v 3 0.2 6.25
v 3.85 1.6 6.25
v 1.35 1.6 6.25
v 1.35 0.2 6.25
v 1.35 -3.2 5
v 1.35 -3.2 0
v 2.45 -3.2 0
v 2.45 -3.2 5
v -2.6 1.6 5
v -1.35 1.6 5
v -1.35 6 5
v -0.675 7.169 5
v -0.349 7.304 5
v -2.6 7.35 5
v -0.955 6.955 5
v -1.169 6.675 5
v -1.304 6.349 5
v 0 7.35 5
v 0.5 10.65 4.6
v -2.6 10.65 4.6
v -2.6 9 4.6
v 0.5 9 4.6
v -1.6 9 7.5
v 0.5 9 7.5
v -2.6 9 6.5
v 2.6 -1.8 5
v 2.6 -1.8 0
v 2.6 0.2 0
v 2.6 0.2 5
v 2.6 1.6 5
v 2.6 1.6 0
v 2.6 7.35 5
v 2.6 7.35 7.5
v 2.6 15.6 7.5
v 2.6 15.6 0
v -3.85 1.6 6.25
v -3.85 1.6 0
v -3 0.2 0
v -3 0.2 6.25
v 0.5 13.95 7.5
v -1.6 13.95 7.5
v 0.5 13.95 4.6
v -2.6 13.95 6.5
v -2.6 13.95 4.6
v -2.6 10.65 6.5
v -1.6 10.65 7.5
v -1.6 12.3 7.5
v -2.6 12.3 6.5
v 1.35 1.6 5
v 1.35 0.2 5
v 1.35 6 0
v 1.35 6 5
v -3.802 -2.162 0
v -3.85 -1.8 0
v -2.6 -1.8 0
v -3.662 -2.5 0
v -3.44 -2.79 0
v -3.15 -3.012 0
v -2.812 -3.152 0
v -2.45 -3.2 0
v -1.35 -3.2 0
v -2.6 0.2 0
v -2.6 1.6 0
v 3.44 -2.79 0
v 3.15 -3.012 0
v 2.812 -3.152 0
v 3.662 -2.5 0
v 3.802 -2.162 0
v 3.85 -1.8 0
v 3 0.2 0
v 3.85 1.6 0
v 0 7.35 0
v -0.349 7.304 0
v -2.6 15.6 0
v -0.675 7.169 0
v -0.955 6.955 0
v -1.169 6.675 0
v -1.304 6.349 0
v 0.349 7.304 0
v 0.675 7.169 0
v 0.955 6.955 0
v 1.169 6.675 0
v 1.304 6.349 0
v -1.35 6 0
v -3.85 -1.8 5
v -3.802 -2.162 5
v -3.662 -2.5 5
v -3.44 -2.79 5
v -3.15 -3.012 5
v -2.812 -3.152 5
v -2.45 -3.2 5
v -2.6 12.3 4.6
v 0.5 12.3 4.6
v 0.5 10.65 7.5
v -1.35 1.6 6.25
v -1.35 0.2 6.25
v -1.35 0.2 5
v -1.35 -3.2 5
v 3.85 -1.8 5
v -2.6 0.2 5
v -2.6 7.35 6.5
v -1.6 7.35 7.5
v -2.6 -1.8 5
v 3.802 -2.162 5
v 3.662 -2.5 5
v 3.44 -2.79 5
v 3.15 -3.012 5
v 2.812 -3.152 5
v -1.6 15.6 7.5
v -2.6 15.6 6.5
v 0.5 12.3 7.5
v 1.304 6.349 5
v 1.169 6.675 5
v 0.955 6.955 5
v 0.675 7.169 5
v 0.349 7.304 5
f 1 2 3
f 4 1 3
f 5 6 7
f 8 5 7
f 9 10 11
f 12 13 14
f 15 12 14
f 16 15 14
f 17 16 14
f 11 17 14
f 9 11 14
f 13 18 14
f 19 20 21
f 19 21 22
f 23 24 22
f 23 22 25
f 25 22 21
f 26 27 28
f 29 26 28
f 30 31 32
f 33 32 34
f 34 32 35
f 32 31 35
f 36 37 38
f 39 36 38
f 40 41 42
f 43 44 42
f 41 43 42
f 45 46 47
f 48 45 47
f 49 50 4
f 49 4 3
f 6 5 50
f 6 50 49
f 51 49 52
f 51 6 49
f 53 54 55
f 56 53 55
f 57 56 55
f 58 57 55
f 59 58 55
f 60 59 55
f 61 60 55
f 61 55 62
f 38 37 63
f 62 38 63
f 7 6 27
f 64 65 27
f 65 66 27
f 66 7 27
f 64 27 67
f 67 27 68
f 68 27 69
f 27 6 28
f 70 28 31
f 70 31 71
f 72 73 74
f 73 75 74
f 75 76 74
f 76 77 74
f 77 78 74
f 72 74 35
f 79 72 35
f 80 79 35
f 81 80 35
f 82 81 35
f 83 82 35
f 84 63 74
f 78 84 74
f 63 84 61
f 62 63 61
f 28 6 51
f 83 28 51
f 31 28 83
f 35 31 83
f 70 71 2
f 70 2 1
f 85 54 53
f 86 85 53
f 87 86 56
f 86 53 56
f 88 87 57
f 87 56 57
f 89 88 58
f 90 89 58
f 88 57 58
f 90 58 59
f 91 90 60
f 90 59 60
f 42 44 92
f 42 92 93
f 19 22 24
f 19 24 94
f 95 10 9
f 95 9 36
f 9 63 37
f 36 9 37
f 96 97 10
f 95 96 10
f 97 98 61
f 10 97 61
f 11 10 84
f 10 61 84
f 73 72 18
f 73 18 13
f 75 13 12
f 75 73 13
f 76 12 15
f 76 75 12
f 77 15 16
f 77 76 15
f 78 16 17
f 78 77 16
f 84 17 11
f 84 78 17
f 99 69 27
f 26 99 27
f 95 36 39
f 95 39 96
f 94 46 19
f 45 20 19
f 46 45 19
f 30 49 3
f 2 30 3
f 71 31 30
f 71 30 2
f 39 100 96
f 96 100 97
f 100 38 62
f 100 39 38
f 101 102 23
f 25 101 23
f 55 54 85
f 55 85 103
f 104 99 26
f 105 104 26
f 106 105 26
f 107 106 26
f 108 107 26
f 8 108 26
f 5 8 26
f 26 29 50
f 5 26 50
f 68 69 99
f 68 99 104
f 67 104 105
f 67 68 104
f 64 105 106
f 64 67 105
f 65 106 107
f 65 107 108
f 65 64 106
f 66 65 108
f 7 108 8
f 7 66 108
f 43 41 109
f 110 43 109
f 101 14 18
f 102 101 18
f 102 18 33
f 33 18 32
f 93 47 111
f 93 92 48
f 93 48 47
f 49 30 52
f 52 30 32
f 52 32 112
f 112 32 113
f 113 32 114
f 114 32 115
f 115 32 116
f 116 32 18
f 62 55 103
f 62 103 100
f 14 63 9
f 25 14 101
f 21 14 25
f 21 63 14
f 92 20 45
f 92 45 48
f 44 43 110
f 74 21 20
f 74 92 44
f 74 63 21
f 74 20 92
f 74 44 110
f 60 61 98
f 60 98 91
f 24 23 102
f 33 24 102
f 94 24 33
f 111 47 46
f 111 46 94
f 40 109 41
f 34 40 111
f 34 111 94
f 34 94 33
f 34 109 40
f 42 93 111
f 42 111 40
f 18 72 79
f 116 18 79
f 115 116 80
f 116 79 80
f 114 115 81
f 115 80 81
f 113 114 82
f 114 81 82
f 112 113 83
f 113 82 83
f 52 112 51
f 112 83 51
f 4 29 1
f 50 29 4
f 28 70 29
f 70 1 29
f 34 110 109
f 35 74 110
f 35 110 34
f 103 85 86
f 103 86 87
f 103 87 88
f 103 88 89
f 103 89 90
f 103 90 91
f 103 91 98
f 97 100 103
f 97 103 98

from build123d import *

# Parameters (mm, degrees)
PAD017_DEPTH           = 5
PAD020_DEPTH           = 6.25
SKETCH055_W            = 5.2
SKETCH055_H            = 1.65
PAD025_DEPTH           = 7.5
SKETCH052_W            = 5.2
SKETCH052_H            = 1.65
PAD026_DEPTH           = 4.6
SKETCH053_W            = 2.1
SKETCH053_H            = 1.65
PAD027_DEPTH           = 7.5
SKETCH054_W            = 5.2
SKETCH054_H            = 1.65
PAD028_DEPTH           = 7.5
LINEARPATTERN011_COUNT = 2
LINEARPATTERN011_PITCH = 3.3
CHAMFER001_SIZE        = 1


with BuildPart() as bc_c:
    # Sketch034 → Pad017 (new body)
    with BuildSketch(Plane.XY):
        with BuildLine():
            Line((-1.35, -1.8), (-1.35, 6))
            ThreePointArc((0, 7.35), (-0.954594, 6.954594), (-1.35, 6))
            Line((0, 9), (0, 7.35))
            Line((-2.6, 9), (0, 9))
            Line((-2.6, -1.8), (-2.6, 9))
            Line((-3.85, -1.8), (-2.6, -1.8))
            ThreePointArc((-3.85, -1.8), (-3.439949, -2.789949), (-2.45, -3.2))
            Line((-1.35, -3.2), (-2.45, -3.2))
            Line((-1.35, -1.8), (-1.35, -3.2))
        make_face()
    extrude(amount=PAD017_DEPTH)

    # Sketch037 → Pad020 (join)
    with BuildSketch(Plane.XY):
        Polygon((-1.35, 0.2), (-1.35, 1.6), (-2.6, 1.6), (-3.85, 1.6), (-3, 0.2), (-2.6, 0.2), align=None)
    extrude(amount=PAD020_DEPTH)


with BuildPart() as bc_s_mirrored:
    # Mirror001: instance of _bc_c
    add(bc_c.part.mirror(Plane(origin=(0, 0, 0), x_dir=(0, 1, 0), z_dir=(-1, 0, 0))))


with BuildPart() as body018:
    # Fusion001 base: copy of _bc_c
    add(bc_c.part)

    # Fusion001: union _bc_s(mirrored)
    add(bc_s_mirrored.part)

    # Sketch055 → Pad025 (new body)
    with BuildSketch(Plane.XY):
        with Locations((0, 8.175)):
            Rectangle(SKETCH055_W, SKETCH055_H)
    extrude(amount=PAD025_DEPTH)

    # Sketch052 → Pad026 (join)
    with BuildSketch(Plane.XY):
        with Locations((0, 9.825)):
            Rectangle(SKETCH052_W, SKETCH052_H)
    pad026 = extrude(amount=PAD026_DEPTH)

    # Sketch053 → Pad027 (join)
    with BuildSketch(Plane.XY):
        with Locations((1.55, 9.825)):
            Rectangle(SKETCH053_W, SKETCH053_H)
    pad027 = extrude(amount=PAD027_DEPTH)

    # Sketch054 → Pad028 (join)
    with BuildSketch(Plane.XY):
        with Locations((0, 11.475)):
            Rectangle(SKETCH054_W, SKETCH054_H)
    pad028 = extrude(amount=PAD028_DEPTH)

    # LinearPattern011: Pad026, Pad027, Pad028 ×2
    with Locations(*[(0, i * LINEARPATTERN011_PITCH, 0) for i in range(1, LINEARPATTERN011_COUNT)]):
        add(pad026)
        add(pad027)
        add(pad028)

    # Chamfer001
    chamfer001_edges = [body018.edges().sort_by_distance(p)[0] for p in [
        (-2.6, 14.775, 7.5),
        (-2.6, 11.475, 7.5),
        (-2.6, 8.175, 7.5),
    ]]
    chamfer(chamfer001_edges, length=CHAMFER001_SIZE)


solid = body018.part
